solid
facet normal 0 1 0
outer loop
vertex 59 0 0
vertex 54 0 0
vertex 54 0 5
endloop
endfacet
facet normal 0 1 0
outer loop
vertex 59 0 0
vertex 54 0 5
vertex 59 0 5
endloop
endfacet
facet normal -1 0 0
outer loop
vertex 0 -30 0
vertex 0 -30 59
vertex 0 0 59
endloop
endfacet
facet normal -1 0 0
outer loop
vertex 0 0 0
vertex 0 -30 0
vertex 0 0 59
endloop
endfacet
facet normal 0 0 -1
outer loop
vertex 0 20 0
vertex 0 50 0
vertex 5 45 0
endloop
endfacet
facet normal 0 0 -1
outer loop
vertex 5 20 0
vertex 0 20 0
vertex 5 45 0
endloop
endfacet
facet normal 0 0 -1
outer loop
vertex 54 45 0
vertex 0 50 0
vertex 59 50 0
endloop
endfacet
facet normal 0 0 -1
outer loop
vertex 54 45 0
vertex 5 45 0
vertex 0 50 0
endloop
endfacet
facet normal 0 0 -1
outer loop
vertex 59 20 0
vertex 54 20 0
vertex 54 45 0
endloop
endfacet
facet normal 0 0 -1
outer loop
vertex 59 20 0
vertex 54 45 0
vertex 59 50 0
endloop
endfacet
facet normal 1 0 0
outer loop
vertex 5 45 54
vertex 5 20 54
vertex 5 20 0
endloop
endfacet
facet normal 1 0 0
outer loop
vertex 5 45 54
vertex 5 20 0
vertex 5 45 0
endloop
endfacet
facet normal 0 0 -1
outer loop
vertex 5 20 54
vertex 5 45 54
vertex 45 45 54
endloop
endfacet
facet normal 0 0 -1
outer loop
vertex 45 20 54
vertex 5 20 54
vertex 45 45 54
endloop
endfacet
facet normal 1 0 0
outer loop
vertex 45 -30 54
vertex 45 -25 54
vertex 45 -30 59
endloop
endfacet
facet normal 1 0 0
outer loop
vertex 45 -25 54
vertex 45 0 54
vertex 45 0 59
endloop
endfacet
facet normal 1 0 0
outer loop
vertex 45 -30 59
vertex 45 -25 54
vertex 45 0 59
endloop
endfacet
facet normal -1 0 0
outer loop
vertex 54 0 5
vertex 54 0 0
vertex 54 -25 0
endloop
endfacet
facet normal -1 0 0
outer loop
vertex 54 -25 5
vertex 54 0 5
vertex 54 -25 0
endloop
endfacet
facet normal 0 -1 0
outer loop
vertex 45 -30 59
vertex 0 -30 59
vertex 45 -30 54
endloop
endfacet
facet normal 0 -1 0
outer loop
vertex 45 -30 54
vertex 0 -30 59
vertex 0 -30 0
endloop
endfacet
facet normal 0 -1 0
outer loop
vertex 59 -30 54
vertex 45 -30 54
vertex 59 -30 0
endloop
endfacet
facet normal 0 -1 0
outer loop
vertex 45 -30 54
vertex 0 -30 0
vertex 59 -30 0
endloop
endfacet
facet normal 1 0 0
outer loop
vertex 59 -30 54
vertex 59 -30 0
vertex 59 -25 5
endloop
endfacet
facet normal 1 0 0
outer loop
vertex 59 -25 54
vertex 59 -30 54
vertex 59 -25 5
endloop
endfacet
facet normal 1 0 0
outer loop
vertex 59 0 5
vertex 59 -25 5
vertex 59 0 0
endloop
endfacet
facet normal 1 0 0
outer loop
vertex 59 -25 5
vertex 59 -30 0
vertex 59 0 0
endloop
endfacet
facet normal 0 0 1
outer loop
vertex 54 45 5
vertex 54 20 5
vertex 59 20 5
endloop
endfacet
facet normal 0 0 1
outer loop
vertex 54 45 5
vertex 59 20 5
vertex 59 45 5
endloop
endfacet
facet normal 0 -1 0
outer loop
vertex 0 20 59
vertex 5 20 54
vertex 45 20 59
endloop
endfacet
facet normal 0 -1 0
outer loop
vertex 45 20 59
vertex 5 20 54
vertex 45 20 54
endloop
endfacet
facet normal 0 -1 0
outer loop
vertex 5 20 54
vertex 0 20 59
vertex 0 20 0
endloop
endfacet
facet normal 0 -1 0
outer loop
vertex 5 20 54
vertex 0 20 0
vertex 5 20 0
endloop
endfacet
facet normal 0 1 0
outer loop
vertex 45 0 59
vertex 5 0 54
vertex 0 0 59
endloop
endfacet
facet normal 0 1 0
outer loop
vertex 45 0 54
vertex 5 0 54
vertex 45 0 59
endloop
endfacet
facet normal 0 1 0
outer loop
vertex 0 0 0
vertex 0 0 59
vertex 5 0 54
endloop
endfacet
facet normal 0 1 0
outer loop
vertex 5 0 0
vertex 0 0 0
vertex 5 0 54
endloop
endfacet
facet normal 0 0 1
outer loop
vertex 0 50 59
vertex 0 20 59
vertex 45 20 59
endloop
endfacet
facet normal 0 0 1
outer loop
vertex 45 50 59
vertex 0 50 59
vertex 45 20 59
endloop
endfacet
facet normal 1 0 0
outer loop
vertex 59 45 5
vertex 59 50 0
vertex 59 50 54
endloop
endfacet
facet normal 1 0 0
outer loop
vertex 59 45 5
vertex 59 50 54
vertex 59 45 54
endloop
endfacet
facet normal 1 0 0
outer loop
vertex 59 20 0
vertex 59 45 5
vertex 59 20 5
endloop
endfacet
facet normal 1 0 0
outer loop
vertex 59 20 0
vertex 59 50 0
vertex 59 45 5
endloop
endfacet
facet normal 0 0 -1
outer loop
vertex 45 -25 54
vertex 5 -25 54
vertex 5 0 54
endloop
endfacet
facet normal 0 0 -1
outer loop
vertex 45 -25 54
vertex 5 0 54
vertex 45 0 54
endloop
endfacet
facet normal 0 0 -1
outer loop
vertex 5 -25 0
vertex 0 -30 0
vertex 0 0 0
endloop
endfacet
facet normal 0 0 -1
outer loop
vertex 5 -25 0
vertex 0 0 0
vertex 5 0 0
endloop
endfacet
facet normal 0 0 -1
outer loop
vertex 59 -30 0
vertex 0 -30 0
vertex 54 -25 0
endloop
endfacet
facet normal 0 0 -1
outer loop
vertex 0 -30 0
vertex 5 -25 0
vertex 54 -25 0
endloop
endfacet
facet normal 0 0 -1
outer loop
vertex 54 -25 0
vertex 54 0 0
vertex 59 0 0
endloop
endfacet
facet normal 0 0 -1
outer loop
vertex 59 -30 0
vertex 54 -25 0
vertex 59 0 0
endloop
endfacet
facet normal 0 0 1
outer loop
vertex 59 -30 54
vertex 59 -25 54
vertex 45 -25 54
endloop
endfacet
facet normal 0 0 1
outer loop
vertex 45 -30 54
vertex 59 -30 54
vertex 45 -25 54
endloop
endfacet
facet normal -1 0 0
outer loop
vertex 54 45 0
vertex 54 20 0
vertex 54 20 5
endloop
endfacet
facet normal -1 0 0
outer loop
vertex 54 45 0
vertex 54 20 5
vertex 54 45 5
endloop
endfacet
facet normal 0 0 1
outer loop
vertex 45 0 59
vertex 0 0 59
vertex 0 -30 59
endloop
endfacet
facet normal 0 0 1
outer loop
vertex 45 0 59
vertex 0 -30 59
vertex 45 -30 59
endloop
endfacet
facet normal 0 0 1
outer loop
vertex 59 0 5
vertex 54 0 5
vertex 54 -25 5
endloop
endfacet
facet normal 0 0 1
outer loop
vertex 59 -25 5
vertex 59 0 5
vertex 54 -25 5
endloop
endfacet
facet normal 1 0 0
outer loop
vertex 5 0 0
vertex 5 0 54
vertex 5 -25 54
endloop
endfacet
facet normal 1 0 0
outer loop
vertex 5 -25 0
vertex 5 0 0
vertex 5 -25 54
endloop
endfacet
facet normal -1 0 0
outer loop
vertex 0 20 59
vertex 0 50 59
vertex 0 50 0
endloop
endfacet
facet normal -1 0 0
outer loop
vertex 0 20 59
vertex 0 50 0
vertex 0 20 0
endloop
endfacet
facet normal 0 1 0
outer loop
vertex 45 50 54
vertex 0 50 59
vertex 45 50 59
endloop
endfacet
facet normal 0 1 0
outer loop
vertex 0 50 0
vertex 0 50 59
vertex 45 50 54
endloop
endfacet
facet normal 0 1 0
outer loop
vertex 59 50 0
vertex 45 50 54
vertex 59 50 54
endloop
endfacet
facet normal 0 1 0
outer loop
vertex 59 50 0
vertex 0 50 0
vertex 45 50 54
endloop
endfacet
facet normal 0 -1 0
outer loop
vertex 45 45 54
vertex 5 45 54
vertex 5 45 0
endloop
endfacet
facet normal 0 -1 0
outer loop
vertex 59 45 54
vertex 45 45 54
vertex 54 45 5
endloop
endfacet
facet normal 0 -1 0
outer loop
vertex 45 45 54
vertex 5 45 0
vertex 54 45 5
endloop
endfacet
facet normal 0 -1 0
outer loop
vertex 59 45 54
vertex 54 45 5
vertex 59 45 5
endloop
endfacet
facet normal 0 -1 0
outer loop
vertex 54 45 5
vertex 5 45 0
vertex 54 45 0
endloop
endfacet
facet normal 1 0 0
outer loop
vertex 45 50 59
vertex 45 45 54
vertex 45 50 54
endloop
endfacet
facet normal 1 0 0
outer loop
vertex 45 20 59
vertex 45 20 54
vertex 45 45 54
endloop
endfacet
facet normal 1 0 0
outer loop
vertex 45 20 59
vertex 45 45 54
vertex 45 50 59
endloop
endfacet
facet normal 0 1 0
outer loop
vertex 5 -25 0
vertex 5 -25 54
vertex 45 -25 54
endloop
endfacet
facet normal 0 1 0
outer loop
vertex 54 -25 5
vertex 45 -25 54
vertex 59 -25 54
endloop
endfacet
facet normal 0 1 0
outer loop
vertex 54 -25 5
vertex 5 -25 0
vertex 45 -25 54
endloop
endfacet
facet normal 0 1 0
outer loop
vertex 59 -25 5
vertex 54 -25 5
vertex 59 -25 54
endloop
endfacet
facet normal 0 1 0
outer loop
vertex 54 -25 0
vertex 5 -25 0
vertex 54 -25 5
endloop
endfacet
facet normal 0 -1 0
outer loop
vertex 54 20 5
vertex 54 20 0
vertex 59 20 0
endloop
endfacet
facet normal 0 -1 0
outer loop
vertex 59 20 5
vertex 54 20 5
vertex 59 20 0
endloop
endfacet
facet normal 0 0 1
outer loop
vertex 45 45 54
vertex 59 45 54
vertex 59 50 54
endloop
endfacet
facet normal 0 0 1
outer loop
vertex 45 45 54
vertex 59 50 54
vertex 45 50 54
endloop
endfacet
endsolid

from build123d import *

# Parameters (mm, degrees)
F0_W     = 59
F0_H     = 30
F1_DEPTH = 59
F2_W     = 49
F2_H     = 25
F3_DEPTH = 54
F4_W     = 25
F4_H     = 49
F5_DEPTH = 5
F6_W     = 14
F6_H     = 5
F7_DEPTH = 30


with BuildPart() as f1:
    # F0 (on Top) → F1 (new body)
    with BuildSketch(Plane.XY):
        with Locations((29.5, -15)):
            Rectangle(F0_W, F0_H)
    extrude(amount=F1_DEPTH)

    # F2 (on face) → F3 (cut)
    with BuildSketch(Plane(origin=(0, 0, 0), x_dir=(1, 0, 0), z_dir=(0, 0, -1))):
        with Locations((29.5, 12.5)):
            Rectangle(F2_W, F2_H)
    extrude(amount=-F3_DEPTH, mode=Mode.SUBTRACT)

    # F4 (on face) → F5 (cut)
    with BuildSketch(Plane(origin=(54, 0, 0), x_dir=(0, -1, 0), z_dir=(-1, 0, 0))):
        with Locations((12.5, 29.5)):
            Rectangle(F4_W, F4_H)
    extrude(amount=-F5_DEPTH, mode=Mode.SUBTRACT)

    # F6 (on face) → F7 (cut)
    with BuildSketch(Plane(origin=(0, 0, 0), x_dir=(-1, 0, 0), z_dir=(0, 1, 0))):
        with Locations((-52, 56.5)):
            Rectangle(F6_W, F6_H)
    extrude(amount=-F7_DEPTH, mode=Mode.SUBTRACT)


with BuildPart() as f9_1:
    # F9: instance of F1
    add(f1.part.mirror(Plane.XZ.offset(-10)))


solid = Compound([f1.part, f9_1.part])
